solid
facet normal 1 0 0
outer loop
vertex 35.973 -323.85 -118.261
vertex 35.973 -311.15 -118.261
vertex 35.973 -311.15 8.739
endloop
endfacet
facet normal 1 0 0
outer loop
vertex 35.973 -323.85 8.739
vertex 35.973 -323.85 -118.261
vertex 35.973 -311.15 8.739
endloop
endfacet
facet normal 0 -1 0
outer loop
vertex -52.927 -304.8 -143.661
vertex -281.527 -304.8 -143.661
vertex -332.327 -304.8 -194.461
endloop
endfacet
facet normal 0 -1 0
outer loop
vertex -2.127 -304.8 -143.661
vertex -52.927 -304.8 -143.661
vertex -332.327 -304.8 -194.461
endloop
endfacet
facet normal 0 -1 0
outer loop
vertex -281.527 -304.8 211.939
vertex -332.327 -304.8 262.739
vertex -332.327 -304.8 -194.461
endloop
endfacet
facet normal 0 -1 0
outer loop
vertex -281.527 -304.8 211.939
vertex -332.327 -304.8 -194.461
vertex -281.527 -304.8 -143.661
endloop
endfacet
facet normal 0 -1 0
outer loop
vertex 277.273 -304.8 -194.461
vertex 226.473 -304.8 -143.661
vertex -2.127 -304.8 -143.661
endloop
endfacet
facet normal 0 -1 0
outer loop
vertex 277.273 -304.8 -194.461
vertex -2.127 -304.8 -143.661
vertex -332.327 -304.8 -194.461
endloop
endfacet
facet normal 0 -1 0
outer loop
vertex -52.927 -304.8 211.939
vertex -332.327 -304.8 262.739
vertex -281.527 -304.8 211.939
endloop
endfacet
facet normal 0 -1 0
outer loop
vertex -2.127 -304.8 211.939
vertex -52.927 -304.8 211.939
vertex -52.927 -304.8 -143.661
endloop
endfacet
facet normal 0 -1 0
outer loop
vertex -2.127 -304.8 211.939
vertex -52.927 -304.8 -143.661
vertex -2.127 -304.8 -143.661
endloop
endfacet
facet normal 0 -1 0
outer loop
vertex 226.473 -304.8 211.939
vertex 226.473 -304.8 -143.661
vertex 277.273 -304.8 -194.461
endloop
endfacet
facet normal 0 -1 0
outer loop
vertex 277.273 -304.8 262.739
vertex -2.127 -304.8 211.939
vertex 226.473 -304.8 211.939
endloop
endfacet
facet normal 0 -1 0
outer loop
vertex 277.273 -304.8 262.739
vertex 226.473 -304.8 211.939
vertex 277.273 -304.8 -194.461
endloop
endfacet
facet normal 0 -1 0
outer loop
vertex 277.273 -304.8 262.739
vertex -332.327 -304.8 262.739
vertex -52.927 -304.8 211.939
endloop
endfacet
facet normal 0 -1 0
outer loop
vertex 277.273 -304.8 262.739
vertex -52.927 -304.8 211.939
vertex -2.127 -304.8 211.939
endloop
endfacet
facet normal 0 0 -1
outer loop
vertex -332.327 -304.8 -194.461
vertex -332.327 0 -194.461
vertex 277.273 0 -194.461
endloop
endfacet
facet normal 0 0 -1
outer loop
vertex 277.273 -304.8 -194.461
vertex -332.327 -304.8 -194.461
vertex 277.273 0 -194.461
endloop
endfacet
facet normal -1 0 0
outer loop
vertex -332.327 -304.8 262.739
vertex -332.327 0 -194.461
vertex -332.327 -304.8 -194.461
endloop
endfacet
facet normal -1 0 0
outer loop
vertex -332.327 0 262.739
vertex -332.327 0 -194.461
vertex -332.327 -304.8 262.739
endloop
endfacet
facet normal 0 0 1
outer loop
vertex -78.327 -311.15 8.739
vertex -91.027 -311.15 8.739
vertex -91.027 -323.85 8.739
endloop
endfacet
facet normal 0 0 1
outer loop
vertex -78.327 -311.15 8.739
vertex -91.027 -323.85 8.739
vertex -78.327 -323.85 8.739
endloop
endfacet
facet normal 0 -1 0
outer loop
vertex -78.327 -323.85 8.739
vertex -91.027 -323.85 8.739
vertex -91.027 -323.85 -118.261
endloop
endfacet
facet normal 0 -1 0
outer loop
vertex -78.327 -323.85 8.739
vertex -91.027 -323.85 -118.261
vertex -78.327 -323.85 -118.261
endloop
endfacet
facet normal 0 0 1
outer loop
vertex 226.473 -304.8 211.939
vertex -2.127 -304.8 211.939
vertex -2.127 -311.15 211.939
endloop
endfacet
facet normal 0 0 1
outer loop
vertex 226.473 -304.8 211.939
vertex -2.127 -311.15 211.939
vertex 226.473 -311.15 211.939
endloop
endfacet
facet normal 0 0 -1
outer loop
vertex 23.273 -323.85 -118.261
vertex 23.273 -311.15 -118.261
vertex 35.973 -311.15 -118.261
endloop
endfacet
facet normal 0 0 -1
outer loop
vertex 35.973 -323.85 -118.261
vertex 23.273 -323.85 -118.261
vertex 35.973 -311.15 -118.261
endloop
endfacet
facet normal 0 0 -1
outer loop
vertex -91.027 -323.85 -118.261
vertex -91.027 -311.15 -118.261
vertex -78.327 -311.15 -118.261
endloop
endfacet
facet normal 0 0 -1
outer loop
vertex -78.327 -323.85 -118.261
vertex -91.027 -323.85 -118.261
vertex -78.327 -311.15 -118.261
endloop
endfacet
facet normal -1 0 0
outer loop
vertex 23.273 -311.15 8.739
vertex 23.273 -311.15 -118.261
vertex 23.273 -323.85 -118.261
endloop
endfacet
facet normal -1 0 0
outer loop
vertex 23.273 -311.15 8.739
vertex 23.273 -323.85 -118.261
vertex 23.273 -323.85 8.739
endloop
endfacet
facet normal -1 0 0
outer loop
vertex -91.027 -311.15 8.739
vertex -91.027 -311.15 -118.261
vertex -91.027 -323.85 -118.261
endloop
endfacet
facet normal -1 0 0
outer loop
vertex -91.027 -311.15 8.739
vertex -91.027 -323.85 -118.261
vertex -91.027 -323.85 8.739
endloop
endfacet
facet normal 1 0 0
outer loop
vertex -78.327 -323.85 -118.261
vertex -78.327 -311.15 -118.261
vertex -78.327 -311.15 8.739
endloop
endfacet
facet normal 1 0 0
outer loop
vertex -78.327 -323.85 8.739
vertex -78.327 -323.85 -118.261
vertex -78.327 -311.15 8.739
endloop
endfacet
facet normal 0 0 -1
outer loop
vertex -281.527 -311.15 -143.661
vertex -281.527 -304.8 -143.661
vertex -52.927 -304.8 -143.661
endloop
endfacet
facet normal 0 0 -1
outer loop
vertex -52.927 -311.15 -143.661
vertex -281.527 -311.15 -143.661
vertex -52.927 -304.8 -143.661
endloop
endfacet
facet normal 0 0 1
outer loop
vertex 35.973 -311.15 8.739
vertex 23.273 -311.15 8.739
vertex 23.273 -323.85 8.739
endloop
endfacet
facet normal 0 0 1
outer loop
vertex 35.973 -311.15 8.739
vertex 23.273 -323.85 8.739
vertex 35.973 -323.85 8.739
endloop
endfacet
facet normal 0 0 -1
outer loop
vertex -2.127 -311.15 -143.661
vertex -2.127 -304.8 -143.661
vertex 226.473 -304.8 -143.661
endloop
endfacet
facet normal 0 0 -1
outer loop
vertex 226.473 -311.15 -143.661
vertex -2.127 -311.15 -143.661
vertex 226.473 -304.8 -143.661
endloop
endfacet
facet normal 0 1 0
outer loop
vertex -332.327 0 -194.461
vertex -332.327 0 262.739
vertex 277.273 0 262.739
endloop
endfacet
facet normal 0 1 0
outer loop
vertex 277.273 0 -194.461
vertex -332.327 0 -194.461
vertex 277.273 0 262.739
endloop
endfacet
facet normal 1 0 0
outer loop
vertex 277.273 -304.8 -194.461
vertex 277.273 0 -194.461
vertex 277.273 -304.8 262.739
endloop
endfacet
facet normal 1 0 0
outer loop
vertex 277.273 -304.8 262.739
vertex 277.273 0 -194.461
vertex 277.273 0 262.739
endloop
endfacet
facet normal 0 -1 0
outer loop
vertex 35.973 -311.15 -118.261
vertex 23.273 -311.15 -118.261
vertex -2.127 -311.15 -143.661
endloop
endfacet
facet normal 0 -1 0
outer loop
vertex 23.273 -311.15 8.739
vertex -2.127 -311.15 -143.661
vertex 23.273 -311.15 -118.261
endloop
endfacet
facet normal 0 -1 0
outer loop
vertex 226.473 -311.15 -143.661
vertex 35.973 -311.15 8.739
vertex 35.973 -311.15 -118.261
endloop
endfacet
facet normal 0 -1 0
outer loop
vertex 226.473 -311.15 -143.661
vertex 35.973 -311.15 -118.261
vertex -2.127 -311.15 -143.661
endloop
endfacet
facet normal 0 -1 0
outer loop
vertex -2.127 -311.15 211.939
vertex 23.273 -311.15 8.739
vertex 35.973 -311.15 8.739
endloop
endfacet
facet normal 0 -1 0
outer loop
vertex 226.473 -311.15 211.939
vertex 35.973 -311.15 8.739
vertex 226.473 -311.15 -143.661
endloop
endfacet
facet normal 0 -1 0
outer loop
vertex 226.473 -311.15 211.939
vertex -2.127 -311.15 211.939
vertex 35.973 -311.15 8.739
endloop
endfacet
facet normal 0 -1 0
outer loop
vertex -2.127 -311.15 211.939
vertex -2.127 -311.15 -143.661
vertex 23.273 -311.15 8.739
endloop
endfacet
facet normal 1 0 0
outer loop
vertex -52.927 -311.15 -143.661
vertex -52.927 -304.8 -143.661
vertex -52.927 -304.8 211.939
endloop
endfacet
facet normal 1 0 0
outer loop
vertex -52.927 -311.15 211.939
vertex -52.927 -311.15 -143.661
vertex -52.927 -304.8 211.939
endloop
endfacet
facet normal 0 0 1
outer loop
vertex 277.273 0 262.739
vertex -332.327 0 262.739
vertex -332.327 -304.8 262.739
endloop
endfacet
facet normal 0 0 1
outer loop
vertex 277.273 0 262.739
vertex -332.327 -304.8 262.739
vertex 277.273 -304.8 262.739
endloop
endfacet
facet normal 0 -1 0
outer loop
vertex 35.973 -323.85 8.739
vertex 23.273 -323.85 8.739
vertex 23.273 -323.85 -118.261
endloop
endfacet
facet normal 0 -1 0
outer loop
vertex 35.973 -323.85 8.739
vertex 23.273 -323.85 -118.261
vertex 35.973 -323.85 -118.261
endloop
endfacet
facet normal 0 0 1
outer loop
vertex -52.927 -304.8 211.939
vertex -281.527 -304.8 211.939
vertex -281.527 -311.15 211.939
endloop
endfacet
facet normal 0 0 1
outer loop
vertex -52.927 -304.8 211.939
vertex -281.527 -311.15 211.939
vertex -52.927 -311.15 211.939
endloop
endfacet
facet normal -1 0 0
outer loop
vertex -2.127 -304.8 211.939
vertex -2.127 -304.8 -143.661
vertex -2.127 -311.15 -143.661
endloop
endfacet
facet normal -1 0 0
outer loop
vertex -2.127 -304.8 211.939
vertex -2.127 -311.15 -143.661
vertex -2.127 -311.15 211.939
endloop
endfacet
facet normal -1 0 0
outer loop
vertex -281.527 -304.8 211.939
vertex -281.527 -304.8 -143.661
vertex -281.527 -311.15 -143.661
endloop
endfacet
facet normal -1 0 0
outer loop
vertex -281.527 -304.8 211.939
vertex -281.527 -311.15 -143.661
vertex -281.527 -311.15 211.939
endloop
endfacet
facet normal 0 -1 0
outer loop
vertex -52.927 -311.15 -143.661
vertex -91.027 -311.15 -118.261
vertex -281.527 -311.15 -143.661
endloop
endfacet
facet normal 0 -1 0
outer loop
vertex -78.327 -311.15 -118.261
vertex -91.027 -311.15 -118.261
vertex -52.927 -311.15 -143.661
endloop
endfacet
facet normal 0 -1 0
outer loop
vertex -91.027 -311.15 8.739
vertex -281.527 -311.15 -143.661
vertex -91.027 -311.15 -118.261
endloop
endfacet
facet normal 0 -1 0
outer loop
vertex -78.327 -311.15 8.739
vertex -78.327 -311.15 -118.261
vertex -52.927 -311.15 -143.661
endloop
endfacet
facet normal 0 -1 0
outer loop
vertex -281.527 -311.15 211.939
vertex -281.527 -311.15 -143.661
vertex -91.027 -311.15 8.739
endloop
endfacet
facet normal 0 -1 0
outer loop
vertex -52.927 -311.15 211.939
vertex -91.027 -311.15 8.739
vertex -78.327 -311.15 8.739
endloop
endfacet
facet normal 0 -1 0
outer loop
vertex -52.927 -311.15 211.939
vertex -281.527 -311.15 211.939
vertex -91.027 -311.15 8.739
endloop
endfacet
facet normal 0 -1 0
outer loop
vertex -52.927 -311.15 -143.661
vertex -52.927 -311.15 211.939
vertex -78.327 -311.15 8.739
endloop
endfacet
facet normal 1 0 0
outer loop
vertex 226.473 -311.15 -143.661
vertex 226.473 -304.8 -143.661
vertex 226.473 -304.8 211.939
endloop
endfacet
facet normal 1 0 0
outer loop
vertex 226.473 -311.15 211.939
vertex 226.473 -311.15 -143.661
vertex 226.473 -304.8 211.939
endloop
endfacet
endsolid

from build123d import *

# Parameters (mm, degrees)
F0_W     = 609.6
F0_H     = 457.2
F1_DEPTH = 304.8
F2_W     = 228.6
F2_H     = 355.6
F3_DEPTH = 6.35
F4_W     = 12.7
F4_H     = 127
F5_DEPTH = 12.7


with BuildPart() as f1:
    # F0 (on Front) → F1 (new body)
    with BuildSketch(Plane.XZ):
        with Locations((-27.527251, 34.139451)):
            Rectangle(F0_W, F0_H)
    extrude(amount=F1_DEPTH)

    # F2 (on face) → F3 (join)
    with BuildSketch(Plane.XZ.offset(304.8)):
        with Locations((-167.227251, 34.139451)):
            Rectangle(F2_W, F2_H)
        with Locations((112.172749, 34.139451)):
            Rectangle(F2_W, F2_H)
    extrude(amount=F3_DEPTH)

    # F4 (on face) → F5 (join)
    with BuildSketch(Plane.XZ.offset(311.15)):
        with Locations((-84.677251, -54.760549)):
            Rectangle(F4_W, F4_H)
        with Locations((29.622749, -54.760549)):
            Rectangle(F4_W, F4_H)
    extrude(amount=F5_DEPTH)


solid = f1.part
